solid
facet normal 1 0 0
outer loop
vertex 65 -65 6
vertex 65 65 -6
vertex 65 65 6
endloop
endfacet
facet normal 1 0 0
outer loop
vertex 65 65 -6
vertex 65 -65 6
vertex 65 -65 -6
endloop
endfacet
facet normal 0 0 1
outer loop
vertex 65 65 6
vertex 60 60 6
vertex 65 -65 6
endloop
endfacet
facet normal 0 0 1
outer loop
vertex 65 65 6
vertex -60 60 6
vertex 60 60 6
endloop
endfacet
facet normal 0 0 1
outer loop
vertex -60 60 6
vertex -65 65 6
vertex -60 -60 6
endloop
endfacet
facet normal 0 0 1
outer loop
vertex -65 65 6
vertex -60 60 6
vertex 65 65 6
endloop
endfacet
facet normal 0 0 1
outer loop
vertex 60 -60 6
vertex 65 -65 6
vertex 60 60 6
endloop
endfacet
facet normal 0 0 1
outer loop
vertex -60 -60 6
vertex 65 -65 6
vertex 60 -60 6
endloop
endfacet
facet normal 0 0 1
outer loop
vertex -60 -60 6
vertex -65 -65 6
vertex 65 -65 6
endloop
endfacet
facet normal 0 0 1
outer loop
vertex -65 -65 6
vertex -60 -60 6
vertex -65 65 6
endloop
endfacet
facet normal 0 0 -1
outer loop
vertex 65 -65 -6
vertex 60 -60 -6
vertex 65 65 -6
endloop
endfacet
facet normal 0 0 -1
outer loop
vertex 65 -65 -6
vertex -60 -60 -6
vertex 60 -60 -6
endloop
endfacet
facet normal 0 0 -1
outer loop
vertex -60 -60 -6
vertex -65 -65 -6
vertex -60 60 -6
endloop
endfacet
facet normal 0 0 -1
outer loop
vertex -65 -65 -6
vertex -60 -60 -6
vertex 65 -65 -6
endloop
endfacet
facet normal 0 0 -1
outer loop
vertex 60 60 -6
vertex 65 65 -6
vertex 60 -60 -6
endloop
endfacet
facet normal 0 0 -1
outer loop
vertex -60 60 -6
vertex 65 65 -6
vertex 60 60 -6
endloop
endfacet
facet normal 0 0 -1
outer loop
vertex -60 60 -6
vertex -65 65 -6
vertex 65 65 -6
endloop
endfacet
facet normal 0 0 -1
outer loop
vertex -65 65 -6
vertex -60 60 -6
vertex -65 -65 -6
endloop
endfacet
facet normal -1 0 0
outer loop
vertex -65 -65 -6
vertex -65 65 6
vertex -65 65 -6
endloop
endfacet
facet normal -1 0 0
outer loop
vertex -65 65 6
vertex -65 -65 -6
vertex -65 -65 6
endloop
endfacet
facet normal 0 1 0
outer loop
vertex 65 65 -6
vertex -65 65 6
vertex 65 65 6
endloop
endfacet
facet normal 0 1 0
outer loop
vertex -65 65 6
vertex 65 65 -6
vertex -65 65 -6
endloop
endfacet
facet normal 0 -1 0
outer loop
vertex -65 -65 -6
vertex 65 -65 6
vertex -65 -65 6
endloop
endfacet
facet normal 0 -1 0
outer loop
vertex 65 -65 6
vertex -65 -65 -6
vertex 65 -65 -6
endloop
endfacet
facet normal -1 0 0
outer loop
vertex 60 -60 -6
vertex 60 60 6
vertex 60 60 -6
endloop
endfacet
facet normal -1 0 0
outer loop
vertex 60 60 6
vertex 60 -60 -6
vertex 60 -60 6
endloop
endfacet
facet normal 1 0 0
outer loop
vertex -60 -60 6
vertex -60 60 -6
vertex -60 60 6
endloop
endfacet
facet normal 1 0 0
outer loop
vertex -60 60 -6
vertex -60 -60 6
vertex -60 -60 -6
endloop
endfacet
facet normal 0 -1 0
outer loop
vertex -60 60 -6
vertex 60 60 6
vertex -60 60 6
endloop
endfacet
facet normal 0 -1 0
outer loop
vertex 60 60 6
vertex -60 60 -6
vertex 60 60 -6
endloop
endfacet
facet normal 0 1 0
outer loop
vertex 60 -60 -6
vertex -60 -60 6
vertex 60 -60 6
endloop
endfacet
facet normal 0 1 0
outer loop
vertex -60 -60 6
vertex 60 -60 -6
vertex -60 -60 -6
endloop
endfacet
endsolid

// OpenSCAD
devide = 10;
joist = 10;


// const
bread = 120;
base = bread + joist;


// create
difference(){
    cube([base, base, bread/devide], center=true);
    cube(bread, true);
}
